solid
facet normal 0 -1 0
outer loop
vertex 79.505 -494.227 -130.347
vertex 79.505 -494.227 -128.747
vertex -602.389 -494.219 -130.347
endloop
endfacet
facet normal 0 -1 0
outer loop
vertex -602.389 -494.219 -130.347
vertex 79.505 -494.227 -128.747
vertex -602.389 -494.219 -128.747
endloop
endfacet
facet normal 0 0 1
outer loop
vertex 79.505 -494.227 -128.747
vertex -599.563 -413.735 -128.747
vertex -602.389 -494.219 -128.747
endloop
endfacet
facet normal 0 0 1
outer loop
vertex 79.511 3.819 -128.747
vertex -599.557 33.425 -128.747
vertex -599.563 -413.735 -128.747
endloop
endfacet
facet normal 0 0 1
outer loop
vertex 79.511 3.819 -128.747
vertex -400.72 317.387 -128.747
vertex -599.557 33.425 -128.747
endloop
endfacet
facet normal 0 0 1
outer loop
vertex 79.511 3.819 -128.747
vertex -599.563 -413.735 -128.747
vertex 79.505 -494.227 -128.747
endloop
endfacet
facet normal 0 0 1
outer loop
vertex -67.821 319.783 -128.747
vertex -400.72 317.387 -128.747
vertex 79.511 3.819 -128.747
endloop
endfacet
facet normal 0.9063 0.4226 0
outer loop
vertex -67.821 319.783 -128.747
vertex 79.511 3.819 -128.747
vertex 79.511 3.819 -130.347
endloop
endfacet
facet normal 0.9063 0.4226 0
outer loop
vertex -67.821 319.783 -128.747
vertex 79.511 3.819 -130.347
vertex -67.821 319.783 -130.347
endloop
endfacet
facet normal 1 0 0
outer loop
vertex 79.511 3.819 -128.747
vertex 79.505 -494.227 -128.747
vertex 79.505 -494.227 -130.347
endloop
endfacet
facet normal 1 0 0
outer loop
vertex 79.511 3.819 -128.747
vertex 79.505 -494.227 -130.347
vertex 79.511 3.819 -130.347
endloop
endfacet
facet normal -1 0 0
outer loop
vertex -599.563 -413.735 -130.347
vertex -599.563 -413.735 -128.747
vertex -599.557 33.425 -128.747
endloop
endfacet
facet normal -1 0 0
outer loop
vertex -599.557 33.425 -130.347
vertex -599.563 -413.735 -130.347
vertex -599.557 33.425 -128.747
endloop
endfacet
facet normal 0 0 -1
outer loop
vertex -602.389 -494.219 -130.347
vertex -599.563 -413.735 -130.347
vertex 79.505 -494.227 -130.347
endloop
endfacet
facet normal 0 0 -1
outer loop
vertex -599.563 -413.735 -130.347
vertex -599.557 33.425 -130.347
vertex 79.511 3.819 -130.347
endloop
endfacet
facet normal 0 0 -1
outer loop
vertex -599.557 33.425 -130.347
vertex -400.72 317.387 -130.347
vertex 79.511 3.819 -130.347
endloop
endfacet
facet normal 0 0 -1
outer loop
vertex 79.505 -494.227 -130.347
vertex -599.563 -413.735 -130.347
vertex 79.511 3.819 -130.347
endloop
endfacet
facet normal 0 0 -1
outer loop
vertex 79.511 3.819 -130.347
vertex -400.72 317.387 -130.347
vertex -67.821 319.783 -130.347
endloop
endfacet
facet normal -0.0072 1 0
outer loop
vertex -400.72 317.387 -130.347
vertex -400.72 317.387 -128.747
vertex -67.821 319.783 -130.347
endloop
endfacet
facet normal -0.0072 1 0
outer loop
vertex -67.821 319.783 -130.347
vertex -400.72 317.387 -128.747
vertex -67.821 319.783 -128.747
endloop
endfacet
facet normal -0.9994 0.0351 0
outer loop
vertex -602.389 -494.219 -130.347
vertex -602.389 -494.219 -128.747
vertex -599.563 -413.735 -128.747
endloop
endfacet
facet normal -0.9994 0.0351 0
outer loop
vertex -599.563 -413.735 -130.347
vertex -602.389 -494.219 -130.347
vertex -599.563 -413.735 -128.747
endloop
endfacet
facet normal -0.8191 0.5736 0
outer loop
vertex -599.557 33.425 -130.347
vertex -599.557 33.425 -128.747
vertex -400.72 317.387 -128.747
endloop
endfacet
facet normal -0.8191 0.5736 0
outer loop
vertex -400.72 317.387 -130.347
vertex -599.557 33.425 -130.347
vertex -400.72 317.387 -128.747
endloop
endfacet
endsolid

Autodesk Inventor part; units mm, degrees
ref_plane "YZ Plane" through (0, 0, 0) normal (1, 0, 0) x (0, 1, 0)
ref_plane "XZ Plane" through (0, 0, 0) normal (0, 1, 0) x (-1, 0, 0)
ref_plane "XY Plane" through (0, 0, 0) normal (0, 0, 1) x (1, 0, 0)
ref_plane "Work Plane1" through (-527.421, 38.0398, -128.7467) normal (0, 0, 1) x (0.9994, -0.0351, 0)
sketch "Sketch1" plane through (-527.421, 38.0398, -128.7467) normal (0, 0, 1) x (0.9994, -0.0351, 0)
  line L0 (-71.9298, -7.1441) -> (116.8182, 283.622) projected
  line L1 (116.8182, 283.622) -> (240.6596, 287.9699) projected
  line L2 (449.4274, 297.701) -> (252.1683, 290.7755) projected
  line L3 (607.7587, -12.8972) -> (449.4274, 297.701) projected
  line L4 (625.2338, -510.6359) -> (607.7587, -12.8972) projected
  line L5 (-56.2402, -454.0286) -> (-71.9298, -7.1441) projected
  point P0 (528.431, -19.5106)
sketch "Sketch2" plane through (-527.421, 38.0398, -128.7467) normal (0, 0, 1) x (0.9994, -0.0351, 0)
  line L0 (-71.9298, -7.1441) -> (116.8182, 283.622) projected
  line L1 (-56.2402, -454.0286) -> (-71.9298, -7.1441) projected
  line L2 (116.8182, 283.622) -> (240.6596, 287.9699) projected
  line L3 (607.7587, -12.8972) -> (449.4274, 297.701) projected
  line L4 (625.2338, -510.6359) -> (607.7587, -12.8972) projected
  line L5 (625.2338, -510.6359) -> (-56.2402, -534.5617)
  line L6 (-56.2402, -534.5617) -> (-56.2402, -454.0286)
  line L7 (116.8182, 283.622) -> (449.4274, 297.701)
  point P0 (528.431, -19.5106)
extrude "Extrusion1" add sketch "Sketch2" against normal blind 1.6
properties part number "cover end plates-02"
